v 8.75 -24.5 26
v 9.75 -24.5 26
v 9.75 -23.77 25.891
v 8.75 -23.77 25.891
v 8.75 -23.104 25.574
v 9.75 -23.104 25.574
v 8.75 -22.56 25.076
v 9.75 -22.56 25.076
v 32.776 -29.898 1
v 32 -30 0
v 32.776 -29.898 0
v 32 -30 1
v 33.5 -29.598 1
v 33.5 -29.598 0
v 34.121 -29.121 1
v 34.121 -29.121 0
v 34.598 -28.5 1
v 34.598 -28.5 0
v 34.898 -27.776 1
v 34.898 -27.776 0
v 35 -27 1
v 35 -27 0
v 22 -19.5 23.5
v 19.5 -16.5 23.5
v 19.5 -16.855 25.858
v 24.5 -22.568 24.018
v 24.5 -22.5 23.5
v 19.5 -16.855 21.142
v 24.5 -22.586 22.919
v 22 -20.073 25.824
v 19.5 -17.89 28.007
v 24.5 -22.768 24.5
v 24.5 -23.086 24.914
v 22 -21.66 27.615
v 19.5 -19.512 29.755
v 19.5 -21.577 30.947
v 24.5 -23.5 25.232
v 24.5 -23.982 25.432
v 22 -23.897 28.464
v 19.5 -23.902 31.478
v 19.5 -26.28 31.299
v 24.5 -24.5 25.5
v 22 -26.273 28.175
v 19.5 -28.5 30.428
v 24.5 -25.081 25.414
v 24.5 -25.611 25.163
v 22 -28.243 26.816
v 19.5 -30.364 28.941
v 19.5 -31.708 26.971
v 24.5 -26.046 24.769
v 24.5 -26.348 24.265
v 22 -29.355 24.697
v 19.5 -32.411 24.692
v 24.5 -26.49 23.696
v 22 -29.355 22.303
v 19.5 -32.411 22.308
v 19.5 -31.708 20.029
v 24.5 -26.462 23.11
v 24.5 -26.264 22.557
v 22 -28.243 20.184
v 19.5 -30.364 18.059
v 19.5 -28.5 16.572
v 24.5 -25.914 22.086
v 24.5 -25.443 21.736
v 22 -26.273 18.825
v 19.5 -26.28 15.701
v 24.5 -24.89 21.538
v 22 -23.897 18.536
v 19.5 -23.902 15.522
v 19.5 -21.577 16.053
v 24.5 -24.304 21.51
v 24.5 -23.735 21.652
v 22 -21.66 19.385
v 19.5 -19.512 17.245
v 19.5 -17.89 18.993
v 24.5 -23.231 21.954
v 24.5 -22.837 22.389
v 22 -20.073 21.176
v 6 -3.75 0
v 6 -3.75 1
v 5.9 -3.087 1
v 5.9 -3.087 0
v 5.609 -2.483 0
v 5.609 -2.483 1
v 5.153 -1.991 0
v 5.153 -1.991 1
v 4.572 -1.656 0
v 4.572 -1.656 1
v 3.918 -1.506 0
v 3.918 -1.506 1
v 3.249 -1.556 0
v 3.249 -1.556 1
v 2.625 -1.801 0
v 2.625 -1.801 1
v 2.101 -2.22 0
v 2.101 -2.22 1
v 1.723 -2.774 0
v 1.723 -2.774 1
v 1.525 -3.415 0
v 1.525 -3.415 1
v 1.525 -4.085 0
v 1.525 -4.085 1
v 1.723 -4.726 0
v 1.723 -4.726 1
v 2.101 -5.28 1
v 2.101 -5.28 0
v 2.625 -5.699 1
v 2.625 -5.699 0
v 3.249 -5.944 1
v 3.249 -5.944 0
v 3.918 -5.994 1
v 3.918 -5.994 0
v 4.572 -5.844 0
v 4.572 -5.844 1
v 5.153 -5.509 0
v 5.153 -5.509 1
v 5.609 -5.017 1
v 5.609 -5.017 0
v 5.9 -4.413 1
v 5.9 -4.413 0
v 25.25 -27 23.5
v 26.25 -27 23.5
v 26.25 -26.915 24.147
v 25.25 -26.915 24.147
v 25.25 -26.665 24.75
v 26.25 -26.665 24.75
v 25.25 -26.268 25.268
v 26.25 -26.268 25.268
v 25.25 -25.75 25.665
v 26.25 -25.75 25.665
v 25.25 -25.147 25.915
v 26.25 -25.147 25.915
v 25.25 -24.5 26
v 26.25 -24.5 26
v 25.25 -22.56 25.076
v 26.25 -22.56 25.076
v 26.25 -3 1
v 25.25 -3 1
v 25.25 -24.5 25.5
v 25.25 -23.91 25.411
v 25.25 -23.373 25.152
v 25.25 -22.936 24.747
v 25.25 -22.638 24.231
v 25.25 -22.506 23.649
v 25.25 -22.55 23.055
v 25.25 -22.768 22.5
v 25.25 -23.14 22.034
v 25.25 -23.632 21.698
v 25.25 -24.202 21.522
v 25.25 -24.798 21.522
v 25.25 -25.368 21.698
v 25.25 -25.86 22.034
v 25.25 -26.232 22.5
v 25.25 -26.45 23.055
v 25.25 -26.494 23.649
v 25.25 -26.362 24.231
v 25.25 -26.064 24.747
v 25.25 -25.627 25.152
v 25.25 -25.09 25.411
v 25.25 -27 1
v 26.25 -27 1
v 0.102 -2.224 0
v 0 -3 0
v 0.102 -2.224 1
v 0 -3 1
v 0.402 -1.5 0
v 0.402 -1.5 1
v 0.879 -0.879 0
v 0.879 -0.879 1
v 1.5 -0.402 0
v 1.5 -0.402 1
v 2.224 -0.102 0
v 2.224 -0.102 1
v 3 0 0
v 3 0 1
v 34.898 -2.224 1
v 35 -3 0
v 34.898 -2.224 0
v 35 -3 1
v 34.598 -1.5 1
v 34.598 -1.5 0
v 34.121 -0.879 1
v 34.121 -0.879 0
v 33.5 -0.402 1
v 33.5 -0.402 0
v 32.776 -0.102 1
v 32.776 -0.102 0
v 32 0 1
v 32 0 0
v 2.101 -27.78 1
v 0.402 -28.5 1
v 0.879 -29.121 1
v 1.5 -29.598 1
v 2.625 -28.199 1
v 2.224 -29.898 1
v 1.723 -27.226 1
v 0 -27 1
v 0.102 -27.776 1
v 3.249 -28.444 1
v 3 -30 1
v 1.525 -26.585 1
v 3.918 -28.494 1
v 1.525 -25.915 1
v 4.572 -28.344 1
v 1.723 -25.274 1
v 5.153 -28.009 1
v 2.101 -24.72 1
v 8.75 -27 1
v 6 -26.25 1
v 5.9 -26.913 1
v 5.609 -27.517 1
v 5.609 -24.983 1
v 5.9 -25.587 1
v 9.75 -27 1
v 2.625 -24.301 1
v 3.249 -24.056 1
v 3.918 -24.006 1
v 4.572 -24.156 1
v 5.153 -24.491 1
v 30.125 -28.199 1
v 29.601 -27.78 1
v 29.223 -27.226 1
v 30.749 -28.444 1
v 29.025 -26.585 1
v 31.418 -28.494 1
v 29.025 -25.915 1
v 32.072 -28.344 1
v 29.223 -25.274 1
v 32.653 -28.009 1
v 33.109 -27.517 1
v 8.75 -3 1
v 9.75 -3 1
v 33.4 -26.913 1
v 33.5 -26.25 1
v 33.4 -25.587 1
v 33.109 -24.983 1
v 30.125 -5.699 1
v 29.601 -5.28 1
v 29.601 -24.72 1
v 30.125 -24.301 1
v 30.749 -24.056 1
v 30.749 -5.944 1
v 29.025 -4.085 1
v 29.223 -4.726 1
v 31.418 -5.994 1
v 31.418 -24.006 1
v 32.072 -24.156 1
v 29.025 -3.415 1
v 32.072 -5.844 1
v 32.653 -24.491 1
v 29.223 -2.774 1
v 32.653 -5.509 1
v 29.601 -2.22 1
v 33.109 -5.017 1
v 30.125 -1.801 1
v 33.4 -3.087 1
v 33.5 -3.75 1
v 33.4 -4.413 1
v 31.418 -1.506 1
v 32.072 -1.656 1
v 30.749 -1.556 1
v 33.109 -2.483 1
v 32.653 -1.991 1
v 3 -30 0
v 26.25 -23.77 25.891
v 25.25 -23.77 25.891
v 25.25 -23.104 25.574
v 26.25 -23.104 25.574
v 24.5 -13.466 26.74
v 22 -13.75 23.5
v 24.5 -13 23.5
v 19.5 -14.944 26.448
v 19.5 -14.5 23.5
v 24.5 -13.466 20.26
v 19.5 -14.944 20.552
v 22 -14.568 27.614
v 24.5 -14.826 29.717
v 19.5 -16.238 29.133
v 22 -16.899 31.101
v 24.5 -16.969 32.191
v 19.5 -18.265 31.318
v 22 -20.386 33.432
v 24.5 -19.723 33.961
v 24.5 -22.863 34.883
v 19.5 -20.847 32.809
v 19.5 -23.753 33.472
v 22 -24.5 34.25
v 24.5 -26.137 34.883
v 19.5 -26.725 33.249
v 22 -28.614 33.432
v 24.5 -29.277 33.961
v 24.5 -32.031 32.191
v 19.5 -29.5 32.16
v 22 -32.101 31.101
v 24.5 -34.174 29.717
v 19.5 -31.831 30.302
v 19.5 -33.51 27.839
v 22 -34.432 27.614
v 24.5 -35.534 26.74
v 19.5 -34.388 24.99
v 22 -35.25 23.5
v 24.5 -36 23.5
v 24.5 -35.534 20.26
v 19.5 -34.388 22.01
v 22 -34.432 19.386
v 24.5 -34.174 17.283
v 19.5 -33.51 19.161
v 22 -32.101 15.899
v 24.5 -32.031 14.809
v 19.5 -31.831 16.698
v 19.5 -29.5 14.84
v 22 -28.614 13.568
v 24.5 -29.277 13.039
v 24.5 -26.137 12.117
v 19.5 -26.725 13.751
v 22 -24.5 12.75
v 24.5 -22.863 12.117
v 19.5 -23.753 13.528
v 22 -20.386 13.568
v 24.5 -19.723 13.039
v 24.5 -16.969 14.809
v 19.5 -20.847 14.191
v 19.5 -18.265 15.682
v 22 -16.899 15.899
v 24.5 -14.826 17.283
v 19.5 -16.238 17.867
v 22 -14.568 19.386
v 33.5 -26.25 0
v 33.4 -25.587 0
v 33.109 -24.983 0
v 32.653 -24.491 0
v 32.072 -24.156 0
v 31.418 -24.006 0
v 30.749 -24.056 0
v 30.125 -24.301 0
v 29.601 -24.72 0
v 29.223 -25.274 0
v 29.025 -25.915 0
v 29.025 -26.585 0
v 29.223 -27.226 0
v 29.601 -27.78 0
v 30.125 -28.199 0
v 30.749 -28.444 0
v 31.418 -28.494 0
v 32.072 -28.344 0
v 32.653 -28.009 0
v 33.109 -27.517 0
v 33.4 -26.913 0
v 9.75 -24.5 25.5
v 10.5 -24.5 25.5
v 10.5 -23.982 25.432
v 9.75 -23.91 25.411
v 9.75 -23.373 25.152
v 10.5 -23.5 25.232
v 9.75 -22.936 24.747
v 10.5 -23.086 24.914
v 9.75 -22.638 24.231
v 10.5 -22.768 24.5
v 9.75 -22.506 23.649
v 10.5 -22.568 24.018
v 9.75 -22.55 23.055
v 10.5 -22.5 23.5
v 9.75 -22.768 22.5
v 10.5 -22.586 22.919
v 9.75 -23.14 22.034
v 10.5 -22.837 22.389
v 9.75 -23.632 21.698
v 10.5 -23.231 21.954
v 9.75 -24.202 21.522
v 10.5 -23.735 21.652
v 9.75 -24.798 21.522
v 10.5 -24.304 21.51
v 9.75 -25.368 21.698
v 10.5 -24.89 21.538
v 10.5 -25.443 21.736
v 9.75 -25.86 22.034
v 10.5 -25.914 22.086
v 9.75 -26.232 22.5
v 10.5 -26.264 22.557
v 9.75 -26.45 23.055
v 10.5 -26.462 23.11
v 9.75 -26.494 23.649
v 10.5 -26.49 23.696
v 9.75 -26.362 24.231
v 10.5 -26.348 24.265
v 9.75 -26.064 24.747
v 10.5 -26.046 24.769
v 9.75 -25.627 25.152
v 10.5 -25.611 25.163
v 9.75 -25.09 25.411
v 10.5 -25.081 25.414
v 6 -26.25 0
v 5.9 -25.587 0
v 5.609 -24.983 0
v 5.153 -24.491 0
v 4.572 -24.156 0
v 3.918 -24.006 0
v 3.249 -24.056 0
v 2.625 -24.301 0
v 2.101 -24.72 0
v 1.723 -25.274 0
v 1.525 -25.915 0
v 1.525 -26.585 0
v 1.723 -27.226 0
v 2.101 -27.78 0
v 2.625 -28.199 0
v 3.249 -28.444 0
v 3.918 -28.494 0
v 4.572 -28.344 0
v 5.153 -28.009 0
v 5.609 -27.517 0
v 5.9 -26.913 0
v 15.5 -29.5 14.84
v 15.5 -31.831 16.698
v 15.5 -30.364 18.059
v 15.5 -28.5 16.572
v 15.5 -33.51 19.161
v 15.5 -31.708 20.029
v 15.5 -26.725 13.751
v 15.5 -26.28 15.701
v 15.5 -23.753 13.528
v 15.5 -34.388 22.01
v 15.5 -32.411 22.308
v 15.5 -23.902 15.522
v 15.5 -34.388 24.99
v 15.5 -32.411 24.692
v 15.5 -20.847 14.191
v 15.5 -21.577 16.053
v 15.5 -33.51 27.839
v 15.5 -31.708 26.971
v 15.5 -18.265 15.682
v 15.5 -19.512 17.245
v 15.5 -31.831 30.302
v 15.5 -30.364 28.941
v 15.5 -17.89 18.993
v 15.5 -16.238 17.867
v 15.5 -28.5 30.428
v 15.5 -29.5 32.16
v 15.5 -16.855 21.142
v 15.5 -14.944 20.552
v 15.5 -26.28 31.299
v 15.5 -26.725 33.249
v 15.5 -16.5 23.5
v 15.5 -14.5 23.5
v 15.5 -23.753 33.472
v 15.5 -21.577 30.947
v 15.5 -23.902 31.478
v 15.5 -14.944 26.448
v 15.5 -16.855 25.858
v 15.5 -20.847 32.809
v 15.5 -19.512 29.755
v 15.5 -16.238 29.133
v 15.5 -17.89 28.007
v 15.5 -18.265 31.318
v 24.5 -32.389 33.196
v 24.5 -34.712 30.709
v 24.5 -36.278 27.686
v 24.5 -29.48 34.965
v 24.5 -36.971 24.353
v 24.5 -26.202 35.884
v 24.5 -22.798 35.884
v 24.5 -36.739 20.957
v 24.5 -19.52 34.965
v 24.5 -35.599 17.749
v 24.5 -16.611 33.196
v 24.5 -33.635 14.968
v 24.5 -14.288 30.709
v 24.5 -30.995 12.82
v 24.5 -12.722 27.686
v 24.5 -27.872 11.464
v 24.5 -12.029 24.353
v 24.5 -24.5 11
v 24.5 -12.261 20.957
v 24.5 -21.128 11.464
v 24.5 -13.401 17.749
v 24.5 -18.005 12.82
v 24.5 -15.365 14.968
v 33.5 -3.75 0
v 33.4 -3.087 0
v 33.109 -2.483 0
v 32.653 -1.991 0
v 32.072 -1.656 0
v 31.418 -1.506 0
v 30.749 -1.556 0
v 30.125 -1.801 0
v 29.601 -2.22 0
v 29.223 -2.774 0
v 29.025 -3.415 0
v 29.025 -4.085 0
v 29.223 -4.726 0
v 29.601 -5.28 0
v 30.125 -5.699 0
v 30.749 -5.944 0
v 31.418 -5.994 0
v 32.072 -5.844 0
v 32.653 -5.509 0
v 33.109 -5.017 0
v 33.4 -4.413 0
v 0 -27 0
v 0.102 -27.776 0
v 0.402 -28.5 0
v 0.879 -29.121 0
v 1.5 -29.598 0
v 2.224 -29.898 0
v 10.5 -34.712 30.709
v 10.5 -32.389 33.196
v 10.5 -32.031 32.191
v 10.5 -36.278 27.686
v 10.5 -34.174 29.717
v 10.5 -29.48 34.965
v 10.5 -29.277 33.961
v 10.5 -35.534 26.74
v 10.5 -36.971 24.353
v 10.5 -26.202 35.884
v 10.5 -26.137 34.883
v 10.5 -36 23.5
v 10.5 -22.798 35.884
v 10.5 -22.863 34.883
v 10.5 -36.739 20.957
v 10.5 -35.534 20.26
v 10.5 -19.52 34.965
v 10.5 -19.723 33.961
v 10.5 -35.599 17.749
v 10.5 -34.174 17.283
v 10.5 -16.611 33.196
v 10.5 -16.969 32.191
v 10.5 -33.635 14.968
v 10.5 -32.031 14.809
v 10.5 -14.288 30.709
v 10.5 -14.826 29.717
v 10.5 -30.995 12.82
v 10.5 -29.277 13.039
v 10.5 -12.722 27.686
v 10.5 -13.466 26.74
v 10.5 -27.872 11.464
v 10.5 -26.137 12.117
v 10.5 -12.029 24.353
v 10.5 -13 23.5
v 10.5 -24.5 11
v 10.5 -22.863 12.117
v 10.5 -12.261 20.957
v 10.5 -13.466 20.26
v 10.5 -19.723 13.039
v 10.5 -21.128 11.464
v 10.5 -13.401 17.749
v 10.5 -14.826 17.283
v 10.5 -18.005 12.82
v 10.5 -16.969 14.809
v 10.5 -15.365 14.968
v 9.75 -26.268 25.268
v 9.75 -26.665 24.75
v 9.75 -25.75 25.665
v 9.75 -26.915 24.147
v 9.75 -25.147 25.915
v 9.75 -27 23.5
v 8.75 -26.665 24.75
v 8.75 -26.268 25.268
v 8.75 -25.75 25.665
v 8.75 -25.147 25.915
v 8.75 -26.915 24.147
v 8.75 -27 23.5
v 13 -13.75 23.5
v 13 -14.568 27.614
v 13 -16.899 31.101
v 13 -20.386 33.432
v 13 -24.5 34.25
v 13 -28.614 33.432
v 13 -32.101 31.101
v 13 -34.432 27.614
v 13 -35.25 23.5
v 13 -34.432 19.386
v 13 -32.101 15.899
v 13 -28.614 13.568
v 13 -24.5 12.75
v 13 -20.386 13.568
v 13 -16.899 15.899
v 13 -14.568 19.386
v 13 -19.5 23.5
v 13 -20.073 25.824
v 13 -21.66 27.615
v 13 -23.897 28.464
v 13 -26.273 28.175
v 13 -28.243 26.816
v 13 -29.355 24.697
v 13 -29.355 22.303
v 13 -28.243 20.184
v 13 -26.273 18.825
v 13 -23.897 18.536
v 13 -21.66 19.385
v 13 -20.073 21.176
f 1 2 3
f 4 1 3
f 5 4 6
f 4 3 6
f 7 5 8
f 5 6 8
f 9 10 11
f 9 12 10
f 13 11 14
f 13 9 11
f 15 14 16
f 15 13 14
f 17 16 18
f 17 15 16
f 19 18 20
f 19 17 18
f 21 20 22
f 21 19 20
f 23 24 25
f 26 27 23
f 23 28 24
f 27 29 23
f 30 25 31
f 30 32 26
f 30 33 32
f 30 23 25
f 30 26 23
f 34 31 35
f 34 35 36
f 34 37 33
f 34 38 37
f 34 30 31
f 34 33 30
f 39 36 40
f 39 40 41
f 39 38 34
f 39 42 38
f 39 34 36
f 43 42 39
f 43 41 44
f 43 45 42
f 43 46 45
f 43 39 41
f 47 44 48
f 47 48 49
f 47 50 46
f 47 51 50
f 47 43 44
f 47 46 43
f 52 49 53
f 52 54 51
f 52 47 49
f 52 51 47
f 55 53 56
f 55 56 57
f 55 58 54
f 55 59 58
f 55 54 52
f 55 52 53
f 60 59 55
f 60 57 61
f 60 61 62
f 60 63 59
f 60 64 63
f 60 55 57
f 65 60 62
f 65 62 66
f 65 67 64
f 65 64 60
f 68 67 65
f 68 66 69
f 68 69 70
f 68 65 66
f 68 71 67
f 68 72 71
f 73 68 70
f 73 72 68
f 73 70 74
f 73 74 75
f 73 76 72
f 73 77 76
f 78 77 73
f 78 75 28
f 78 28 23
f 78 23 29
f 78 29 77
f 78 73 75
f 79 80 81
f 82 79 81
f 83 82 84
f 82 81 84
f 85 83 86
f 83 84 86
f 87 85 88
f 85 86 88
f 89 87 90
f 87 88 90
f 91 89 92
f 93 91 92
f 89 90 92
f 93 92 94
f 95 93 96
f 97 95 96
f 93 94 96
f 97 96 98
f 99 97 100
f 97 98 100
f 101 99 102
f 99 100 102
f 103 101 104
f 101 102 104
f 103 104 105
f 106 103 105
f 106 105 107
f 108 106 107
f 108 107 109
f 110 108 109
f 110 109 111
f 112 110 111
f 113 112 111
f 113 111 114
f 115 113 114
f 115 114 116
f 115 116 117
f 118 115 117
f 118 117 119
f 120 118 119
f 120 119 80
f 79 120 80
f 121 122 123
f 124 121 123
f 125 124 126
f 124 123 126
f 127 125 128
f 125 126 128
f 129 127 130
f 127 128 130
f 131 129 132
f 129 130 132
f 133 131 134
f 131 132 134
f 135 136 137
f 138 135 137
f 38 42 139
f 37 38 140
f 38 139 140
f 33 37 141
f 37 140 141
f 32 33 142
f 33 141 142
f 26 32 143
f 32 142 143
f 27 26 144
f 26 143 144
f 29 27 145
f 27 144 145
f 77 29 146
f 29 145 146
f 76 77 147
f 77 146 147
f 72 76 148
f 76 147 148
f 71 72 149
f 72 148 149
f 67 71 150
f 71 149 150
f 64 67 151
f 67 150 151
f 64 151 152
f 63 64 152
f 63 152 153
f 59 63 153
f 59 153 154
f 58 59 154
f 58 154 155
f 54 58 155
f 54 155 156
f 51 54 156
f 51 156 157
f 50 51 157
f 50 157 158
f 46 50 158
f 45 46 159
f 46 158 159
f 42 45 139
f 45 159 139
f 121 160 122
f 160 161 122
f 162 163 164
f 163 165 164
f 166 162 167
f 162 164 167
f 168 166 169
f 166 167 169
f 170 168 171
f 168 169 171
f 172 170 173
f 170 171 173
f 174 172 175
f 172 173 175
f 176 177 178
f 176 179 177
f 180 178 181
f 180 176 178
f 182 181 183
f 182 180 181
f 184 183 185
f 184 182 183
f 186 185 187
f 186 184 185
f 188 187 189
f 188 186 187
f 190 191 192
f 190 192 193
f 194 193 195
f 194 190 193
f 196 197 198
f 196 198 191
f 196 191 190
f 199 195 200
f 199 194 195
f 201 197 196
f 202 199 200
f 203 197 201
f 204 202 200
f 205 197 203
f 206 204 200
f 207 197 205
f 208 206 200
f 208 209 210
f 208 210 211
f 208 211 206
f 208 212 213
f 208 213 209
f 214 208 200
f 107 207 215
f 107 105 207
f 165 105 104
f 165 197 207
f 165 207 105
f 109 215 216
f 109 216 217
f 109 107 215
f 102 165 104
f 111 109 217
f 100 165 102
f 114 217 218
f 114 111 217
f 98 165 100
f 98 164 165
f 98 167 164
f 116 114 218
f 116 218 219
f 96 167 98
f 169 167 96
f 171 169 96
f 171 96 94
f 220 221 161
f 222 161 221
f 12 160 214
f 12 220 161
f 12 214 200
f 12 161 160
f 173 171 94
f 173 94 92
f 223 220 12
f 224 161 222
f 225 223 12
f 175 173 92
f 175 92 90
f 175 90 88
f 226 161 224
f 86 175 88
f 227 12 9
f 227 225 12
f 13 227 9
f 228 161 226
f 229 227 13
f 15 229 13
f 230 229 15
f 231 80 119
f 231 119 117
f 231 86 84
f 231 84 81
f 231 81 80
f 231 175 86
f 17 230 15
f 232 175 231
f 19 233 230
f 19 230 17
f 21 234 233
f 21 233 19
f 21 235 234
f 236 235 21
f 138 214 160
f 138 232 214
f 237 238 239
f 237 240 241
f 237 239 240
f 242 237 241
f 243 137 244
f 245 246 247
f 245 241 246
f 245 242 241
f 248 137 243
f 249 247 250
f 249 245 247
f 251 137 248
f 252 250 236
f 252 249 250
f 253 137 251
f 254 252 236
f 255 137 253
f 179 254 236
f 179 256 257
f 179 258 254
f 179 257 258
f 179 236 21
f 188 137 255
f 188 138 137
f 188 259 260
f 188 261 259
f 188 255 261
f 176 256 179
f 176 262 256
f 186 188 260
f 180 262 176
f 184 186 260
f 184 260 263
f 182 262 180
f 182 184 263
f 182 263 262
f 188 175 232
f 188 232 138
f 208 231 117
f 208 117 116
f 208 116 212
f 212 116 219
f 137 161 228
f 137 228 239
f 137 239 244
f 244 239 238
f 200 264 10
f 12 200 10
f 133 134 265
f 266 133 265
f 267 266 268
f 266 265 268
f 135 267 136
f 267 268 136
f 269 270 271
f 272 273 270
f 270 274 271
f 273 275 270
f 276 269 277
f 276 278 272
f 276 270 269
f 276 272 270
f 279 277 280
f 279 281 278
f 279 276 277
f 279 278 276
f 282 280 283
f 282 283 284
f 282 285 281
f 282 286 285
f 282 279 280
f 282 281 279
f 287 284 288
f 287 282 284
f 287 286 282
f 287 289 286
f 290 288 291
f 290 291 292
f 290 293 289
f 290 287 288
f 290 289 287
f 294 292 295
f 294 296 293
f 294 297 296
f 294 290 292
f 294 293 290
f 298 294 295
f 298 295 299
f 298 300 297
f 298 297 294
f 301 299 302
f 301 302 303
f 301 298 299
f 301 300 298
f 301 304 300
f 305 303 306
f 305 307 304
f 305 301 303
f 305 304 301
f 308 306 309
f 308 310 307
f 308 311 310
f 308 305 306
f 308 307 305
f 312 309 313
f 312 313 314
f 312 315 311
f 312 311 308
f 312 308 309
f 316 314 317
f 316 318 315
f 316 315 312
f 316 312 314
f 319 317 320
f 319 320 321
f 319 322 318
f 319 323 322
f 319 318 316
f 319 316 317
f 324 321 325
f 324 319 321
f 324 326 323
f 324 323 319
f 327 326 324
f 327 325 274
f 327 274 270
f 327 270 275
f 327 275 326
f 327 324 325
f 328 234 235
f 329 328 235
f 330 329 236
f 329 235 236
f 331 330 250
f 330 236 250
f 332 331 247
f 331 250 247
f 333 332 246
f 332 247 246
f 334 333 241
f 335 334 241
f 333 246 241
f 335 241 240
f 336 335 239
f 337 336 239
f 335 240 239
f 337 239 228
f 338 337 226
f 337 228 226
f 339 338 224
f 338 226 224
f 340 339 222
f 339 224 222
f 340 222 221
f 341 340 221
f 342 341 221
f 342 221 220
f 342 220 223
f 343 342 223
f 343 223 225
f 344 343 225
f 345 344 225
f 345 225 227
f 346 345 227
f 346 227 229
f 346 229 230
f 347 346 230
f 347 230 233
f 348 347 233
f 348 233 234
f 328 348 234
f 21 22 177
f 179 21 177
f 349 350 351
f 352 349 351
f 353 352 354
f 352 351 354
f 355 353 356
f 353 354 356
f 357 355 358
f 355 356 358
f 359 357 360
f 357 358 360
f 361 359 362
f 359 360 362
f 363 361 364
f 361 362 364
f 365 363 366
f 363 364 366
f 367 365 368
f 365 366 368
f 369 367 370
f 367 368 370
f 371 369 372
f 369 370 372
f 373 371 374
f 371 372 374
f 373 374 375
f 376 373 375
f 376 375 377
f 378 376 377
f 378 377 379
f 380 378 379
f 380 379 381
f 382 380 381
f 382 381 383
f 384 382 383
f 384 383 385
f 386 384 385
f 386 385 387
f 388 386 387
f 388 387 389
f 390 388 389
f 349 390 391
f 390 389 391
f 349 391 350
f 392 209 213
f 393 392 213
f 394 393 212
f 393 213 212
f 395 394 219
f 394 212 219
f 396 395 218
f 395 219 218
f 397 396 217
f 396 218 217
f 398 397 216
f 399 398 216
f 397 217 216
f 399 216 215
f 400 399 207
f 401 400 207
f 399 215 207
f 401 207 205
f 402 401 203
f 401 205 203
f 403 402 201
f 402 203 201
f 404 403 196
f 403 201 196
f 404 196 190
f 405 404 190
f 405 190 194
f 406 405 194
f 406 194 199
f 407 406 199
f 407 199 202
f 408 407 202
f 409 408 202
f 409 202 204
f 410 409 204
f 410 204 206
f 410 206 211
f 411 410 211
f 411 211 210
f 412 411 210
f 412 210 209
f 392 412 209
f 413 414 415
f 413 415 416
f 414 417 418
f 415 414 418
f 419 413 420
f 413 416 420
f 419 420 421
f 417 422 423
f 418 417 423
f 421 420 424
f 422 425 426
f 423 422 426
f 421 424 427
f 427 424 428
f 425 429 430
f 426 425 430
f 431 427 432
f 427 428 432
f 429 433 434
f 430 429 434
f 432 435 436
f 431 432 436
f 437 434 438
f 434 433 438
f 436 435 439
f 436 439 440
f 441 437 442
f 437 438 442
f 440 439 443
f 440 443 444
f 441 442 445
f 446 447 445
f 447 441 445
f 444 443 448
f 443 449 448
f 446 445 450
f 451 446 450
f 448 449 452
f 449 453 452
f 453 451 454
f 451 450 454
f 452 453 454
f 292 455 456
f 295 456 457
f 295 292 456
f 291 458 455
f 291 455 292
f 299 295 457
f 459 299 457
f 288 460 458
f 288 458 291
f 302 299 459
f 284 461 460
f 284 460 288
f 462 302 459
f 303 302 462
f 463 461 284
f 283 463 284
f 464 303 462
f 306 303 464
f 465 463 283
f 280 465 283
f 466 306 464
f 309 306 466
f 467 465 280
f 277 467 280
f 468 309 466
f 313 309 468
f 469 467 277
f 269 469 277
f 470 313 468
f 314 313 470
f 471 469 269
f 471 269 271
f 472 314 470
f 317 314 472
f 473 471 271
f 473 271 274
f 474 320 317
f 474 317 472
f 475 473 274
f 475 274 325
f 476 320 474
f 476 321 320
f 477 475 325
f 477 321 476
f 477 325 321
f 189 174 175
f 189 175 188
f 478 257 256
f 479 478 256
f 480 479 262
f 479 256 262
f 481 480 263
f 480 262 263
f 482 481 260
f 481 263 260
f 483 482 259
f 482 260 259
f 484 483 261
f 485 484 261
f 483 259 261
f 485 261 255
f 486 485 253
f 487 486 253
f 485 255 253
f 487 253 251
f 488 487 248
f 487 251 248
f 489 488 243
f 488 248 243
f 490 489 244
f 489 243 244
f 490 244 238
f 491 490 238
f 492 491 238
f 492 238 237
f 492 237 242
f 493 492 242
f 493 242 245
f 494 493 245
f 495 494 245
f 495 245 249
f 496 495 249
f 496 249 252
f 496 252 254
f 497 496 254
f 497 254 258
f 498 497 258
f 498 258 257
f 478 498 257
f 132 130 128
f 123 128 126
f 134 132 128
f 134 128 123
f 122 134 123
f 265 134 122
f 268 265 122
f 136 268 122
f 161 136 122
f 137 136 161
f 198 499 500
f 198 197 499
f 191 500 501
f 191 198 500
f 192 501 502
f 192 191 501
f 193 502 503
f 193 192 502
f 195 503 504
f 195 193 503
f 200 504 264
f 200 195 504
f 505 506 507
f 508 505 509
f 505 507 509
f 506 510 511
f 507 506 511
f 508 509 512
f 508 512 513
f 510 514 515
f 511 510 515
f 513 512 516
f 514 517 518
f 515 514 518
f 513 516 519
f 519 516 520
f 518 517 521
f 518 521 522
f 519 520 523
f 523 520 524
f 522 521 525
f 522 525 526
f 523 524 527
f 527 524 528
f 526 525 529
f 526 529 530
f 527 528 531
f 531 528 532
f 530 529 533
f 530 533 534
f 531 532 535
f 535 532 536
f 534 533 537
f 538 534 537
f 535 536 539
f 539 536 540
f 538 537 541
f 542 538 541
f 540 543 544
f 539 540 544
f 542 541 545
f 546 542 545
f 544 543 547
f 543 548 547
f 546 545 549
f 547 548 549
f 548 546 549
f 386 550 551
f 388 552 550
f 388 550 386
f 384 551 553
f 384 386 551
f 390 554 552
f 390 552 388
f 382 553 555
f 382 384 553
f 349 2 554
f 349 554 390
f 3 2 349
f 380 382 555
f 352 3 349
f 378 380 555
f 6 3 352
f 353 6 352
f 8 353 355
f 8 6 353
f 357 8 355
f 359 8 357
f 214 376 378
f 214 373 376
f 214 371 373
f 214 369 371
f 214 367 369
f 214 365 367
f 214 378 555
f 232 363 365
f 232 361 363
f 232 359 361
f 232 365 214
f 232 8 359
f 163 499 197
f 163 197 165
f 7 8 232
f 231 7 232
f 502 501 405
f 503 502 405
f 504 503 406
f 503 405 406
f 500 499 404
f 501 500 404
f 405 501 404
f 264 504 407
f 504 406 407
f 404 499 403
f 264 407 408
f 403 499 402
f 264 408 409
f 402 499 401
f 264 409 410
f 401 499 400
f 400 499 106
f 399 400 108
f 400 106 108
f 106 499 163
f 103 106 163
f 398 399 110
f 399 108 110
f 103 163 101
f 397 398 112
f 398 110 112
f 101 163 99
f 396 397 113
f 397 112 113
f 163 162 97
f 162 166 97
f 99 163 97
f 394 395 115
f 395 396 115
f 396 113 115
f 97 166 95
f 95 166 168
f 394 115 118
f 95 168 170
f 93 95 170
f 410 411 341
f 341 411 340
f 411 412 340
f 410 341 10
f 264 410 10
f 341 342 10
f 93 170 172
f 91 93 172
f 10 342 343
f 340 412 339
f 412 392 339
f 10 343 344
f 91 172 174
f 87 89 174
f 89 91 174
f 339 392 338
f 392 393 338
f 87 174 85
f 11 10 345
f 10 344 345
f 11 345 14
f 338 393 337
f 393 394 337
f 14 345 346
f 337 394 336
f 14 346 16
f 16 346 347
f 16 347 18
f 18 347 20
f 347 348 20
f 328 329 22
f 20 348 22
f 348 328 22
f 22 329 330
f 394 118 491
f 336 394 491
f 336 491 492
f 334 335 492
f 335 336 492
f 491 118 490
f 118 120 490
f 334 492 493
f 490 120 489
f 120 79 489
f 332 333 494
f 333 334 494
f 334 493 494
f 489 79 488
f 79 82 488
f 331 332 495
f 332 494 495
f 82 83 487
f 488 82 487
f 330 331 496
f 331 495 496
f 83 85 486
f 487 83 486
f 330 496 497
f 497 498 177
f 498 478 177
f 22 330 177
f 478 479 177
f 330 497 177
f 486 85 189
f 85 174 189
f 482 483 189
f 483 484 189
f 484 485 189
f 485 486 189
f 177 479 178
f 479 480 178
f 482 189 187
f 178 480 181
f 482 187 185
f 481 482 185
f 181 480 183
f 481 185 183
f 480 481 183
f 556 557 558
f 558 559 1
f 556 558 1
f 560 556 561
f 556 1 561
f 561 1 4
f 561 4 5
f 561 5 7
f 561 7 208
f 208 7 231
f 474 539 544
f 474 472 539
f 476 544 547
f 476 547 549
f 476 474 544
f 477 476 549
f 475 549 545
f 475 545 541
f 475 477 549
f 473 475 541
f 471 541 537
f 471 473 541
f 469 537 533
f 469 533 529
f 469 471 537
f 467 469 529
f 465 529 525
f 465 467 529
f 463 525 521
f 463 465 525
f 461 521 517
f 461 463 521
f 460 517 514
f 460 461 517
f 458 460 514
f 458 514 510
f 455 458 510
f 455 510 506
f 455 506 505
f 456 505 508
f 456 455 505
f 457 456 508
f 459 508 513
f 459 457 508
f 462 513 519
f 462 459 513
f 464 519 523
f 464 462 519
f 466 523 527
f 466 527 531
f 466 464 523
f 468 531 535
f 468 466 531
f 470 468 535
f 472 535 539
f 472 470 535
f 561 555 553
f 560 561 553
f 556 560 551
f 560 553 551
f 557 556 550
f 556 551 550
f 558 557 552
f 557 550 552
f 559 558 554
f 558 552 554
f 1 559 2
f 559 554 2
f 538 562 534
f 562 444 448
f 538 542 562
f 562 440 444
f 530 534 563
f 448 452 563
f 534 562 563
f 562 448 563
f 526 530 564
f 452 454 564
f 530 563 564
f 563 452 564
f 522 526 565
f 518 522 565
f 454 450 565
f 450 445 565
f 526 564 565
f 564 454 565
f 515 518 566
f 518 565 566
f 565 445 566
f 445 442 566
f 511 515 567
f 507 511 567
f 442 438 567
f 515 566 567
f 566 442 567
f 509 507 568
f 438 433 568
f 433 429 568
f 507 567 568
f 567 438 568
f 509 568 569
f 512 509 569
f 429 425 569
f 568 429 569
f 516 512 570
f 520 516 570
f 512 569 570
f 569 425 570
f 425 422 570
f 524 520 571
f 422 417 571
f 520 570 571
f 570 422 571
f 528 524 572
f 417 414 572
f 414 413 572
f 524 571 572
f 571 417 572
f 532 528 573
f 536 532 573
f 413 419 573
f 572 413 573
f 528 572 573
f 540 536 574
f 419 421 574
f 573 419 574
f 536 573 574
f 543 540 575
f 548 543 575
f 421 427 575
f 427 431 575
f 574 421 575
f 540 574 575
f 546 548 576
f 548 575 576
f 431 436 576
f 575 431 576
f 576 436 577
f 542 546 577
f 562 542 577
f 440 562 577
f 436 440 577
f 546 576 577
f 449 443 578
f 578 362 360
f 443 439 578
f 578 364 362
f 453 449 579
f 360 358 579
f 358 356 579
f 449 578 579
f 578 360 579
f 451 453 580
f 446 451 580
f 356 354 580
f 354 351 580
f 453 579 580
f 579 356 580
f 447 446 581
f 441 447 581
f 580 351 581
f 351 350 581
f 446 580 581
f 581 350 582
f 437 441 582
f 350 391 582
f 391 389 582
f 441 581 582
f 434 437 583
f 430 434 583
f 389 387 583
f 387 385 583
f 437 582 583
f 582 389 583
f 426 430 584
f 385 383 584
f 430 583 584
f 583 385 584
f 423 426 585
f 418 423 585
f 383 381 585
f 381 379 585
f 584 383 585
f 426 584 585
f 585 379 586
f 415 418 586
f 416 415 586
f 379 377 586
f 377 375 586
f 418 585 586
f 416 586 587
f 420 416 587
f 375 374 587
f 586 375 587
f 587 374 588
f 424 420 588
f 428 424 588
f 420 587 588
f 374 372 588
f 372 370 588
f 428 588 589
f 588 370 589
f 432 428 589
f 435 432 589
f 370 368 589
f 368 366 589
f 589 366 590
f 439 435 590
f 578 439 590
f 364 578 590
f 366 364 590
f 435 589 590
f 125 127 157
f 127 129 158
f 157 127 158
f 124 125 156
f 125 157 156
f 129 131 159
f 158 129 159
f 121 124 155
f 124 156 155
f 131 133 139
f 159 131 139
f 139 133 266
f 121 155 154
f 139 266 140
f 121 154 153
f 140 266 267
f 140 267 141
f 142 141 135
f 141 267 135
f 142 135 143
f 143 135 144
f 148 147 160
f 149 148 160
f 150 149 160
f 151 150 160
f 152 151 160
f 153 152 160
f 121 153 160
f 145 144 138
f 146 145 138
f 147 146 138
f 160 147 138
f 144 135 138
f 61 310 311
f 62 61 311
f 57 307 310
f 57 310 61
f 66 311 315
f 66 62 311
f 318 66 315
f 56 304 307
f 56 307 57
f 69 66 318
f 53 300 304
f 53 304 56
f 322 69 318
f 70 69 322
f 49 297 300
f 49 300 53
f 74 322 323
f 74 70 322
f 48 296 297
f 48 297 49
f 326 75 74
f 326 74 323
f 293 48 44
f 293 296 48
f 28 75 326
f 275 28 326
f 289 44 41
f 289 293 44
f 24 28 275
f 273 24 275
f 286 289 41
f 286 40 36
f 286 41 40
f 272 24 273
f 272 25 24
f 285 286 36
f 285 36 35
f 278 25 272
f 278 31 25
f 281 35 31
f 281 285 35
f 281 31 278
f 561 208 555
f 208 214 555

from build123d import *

# Parameters (mm, degrees)
SKETCH_1_W          = 35
SKETCH_1_H          = 30
EXTRUDE_1_DEPTH     = 1
FILLET_1_R          = 3
SKETCH_2_R          = 2.25
CUT_EXTRUDE_1_DEPTH = 2
SKETCH_3_W          = 1
SKETCH_3_H          = 25
EXTRUDE_2_DEPTH     = 30
CUT_EXTRUDE_2_DEPTH = 27.25
EXTRUDE_3_REACH     = 27.25
SKETCH_5_R          = 2
SKETCH_6_R          = 12.5
EXTRUDE_4_DEPTH     = 7


with BuildPart() as part:
    # ｽｹｯﾁ1 → ﾎﾞｽ - 押し出し1 (new body)
    with BuildSketch(Plane.XY):
        with Locations((17.5, -15)):
            Rectangle(SKETCH_1_W, SKETCH_1_H)
    extrude(amount=EXTRUDE_1_DEPTH)

    # ﾌｨﾚｯﾄ1
    fillet_1_edges = [part.edges().sort_by_distance(p)[0] for p in [
        (0, 0, 0.5),
        (35, 0, 0.5),
        (35, -30, 0.5),
        (0, -30, 0.5),
    ]]
    fillet(fillet_1_edges, radius=FILLET_1_R)

    # ｽｹｯﾁ2 → ｶｯﾄ - 押し出し1 (cut, through all)
    with BuildSketch(Plane.XY.offset(1)):
        with Locations((31.25, -3.75)):
            Circle(SKETCH_2_R)
        with Locations((31.25, -26.25)):
            Circle(SKETCH_2_R)
        with Locations((3.75, -26.25)):
            Circle(SKETCH_2_R)
        with Locations((3.75, -3.75)):
            Circle(SKETCH_2_R)
    extrude(amount=-CUT_EXTRUDE_1_DEPTH, mode=Mode.SUBTRACT)

    # ｽｹｯﾁ3 → ﾎﾞｽ - 押し出し2 (add)
    with BuildSketch(Plane(origin=(0, 0, 0), x_dir=(1, 0, 0), z_dir=(0, 1, 0))):
        with Locations((9.25, -13.5)):
            Rectangle(SKETCH_3_W, SKETCH_3_H)
        with Locations((25.75, -13.5)):
            Rectangle(SKETCH_3_W, SKETCH_3_H)
    extrude(amount=-EXTRUDE_2_DEPTH)

    # ｽｹｯﾁ4 → ｶｯﾄ - 押し出し2 (cut, through all)
    with BuildSketch(Plane(origin=(26.25, 0, 0), x_dir=(0, 0, -1), z_dir=(1, 0, 0))):
        with BuildLine():
            ThreePointArc((-26, -24.5), (-25.757311392, -23.425502313), (-25.076363776, -22.559619304))
            Line((-25.076363776, -22.559619304), (-1, -3))
            Line((-1, -3), (-1, 0))
            Line((-1, 0), (-26, 0))
            Line((-26, 0), (-26, -24.5))
        make_face()
        with BuildLine():
            ThreePointArc((-23.5, -27), (-25.267766953, -26.267766953), (-26, -24.5))
            Line((-26, -24.5), (-26, -30))
            Line((-26, -30), (-1, -30))
            Line((-1, -30), (-1, -27))
            Line((-1, -27), (-23.5, -27))
        make_face()
    extrude(amount=-CUT_EXTRUDE_2_DEPTH, mode=Mode.SUBTRACT)

    # ｽｹｯﾁ5 → ﾎﾞｽ - 押し出し3 (add, up to next)
    with BuildSketch(Plane.ZY.offset(-25.25), mode=Mode.PRIVATE) as extrude_3_sk1:
        with Locations((23.5, -24.5)):
            Circle(SKETCH_5_R)
    extrude_3_tool1 = extrude(extrude_3_sk1.sketch, amount=EXTRUDE_3_REACH, mode=Mode.PRIVATE) - part.part
    add(extrude_3_tool1.solids().sort_by_distance((25.25, -24.5, 23.5))[0])

    # ｽｹｯﾁ6 → ﾎﾞｽ - 押し出し4 (add, symmetric)
    with BuildSketch(Plane(origin=(17.5, 0, 0), x_dir=(0, 0, -1), z_dir=(1, 0, 0))):
        with Locations((-23.5, -24.5)):
            Circle(SKETCH_6_R)
    extrude(amount=EXTRUDE_4_DEPTH, both=True)

    # ｽｹｯﾁ7 → ｶｯﾄ - 回転1 (revolve, cut)
    with BuildSketch(Plane(origin=(0, 0, 23.5), x_dir=(-1, 0, 0), z_dir=(0, 0, -1))):
        Polygon((-24.5, -13), (-19.5, -14.5), (-19.5, -16.5), (-24.5, -22.5), align=None)
        Polygon((-10.5, -13), (-15.5, -14.5), (-15.5, -16.5), (-10.5, -22.5), align=None)
    revolve(axis=Axis((-9.093978877, -24.5, 23.5), (1, 0, 0)), mode=Mode.SUBTRACT)


solid = part.part
